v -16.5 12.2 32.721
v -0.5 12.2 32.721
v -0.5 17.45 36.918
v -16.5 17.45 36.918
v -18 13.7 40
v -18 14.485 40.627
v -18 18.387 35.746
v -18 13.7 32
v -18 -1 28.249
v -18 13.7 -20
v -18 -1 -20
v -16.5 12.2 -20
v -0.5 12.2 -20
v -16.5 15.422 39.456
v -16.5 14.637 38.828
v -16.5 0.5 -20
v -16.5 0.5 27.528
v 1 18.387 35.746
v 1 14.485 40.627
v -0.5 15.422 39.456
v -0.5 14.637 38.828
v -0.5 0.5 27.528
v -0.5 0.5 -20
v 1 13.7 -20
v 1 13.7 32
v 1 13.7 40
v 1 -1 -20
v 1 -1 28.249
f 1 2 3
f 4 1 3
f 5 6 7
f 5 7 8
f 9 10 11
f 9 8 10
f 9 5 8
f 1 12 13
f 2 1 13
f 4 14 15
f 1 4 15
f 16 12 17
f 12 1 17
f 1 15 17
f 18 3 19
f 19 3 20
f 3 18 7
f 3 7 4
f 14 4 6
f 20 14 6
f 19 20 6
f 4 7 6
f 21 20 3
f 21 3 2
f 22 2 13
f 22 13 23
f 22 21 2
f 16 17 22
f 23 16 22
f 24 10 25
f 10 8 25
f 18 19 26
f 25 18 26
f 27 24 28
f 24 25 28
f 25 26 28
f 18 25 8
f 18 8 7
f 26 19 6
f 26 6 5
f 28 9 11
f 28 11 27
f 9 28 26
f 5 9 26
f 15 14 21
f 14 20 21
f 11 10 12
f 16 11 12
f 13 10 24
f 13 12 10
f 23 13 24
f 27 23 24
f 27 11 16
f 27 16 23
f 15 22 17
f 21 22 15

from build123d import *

# Parameters (mm, degrees)
F0_W      = 19
F0_H      = 14.7
F0_W_2    = 17
F0_H_2    = 12.7
F1_DEPTH  = 40
F3_DEPTH  = 19.001
F5_DEPTH  = 19
F6_T      = -1.5
F8_DEPTH  = 19.001
F9_W      = 19
F9_H      = 14.7
F9_W_2    = 16
F9_H_2    = 11.7
F10_DEPTH = 20


with BuildPart() as f1:
    # F0 (on Top) → F1 (new body)
    with BuildSketch(Plane.XY):
        with Locations((-8.5, 6.35)):
            Rectangle(F0_W, F0_H)
        with Locations((-8.5, 6.35)):
            Rectangle(F0_W_2, F0_H_2, mode=Mode.SUBTRACT)
        with Locations((-8.5, 6.35)):
            Rectangle(F0_W_2, F0_H_2)
    extrude(amount=F1_DEPTH)

    # F2 (on face) → F3 (cut, through all)
    with BuildSketch(Plane.YZ.offset(1)):
        Polygon((-1, 40), (-1, 28.249386698), (13.7, 40), align=None)
    extrude(amount=-F3_DEPTH, mode=Mode.SUBTRACT)

    # F4 (on face) → F5 (join)
    with BuildSketch(Plane.YZ.offset(1)):
        Polygon((18.3866723446, 43.7463451969), (13.7, 40), (13.7, 32), (18.3866723446, 35.7463451969), align=None)
    extrude(amount=-F5_DEPTH)

    # F6
    f6_openings = [f1.faces().sort_by_distance(p)[0] for p in [
        (-8.5, 18.386672, 39.746345),
        (-8.5, 6.35, 0),
    ]]
    offset(amount=F6_T, openings=f6_openings, kind=Kind.INTERSECTION)

    # F7 (on face) → F8 (cut, through all)
    with BuildSketch(Plane(origin=(-18, 0, 0), x_dir=(0, -1, 0), z_dir=(-1, 0, 0))):
        Polygon((-18.3866723446, 43.7463451969), (-18.3866723446, 35.7463451969), (-14.4849184718, 40.627433567), align=None)
    extrude(amount=-F8_DEPTH, mode=Mode.SUBTRACT)

    # F9 (on face) → F10 (join)
    with BuildSketch(Plane(origin=(0, 0, 0), x_dir=(1, 0, 0), z_dir=(0, 0, -1))):
        with Locations((-8.5, -6.35)):
            Rectangle(F9_W, F9_H)
        with Locations((-8.5, -6.35)):
            Rectangle(F9_W_2, F9_H_2, mode=Mode.SUBTRACT)
    extrude(amount=F10_DEPTH)


solid = f1.part
